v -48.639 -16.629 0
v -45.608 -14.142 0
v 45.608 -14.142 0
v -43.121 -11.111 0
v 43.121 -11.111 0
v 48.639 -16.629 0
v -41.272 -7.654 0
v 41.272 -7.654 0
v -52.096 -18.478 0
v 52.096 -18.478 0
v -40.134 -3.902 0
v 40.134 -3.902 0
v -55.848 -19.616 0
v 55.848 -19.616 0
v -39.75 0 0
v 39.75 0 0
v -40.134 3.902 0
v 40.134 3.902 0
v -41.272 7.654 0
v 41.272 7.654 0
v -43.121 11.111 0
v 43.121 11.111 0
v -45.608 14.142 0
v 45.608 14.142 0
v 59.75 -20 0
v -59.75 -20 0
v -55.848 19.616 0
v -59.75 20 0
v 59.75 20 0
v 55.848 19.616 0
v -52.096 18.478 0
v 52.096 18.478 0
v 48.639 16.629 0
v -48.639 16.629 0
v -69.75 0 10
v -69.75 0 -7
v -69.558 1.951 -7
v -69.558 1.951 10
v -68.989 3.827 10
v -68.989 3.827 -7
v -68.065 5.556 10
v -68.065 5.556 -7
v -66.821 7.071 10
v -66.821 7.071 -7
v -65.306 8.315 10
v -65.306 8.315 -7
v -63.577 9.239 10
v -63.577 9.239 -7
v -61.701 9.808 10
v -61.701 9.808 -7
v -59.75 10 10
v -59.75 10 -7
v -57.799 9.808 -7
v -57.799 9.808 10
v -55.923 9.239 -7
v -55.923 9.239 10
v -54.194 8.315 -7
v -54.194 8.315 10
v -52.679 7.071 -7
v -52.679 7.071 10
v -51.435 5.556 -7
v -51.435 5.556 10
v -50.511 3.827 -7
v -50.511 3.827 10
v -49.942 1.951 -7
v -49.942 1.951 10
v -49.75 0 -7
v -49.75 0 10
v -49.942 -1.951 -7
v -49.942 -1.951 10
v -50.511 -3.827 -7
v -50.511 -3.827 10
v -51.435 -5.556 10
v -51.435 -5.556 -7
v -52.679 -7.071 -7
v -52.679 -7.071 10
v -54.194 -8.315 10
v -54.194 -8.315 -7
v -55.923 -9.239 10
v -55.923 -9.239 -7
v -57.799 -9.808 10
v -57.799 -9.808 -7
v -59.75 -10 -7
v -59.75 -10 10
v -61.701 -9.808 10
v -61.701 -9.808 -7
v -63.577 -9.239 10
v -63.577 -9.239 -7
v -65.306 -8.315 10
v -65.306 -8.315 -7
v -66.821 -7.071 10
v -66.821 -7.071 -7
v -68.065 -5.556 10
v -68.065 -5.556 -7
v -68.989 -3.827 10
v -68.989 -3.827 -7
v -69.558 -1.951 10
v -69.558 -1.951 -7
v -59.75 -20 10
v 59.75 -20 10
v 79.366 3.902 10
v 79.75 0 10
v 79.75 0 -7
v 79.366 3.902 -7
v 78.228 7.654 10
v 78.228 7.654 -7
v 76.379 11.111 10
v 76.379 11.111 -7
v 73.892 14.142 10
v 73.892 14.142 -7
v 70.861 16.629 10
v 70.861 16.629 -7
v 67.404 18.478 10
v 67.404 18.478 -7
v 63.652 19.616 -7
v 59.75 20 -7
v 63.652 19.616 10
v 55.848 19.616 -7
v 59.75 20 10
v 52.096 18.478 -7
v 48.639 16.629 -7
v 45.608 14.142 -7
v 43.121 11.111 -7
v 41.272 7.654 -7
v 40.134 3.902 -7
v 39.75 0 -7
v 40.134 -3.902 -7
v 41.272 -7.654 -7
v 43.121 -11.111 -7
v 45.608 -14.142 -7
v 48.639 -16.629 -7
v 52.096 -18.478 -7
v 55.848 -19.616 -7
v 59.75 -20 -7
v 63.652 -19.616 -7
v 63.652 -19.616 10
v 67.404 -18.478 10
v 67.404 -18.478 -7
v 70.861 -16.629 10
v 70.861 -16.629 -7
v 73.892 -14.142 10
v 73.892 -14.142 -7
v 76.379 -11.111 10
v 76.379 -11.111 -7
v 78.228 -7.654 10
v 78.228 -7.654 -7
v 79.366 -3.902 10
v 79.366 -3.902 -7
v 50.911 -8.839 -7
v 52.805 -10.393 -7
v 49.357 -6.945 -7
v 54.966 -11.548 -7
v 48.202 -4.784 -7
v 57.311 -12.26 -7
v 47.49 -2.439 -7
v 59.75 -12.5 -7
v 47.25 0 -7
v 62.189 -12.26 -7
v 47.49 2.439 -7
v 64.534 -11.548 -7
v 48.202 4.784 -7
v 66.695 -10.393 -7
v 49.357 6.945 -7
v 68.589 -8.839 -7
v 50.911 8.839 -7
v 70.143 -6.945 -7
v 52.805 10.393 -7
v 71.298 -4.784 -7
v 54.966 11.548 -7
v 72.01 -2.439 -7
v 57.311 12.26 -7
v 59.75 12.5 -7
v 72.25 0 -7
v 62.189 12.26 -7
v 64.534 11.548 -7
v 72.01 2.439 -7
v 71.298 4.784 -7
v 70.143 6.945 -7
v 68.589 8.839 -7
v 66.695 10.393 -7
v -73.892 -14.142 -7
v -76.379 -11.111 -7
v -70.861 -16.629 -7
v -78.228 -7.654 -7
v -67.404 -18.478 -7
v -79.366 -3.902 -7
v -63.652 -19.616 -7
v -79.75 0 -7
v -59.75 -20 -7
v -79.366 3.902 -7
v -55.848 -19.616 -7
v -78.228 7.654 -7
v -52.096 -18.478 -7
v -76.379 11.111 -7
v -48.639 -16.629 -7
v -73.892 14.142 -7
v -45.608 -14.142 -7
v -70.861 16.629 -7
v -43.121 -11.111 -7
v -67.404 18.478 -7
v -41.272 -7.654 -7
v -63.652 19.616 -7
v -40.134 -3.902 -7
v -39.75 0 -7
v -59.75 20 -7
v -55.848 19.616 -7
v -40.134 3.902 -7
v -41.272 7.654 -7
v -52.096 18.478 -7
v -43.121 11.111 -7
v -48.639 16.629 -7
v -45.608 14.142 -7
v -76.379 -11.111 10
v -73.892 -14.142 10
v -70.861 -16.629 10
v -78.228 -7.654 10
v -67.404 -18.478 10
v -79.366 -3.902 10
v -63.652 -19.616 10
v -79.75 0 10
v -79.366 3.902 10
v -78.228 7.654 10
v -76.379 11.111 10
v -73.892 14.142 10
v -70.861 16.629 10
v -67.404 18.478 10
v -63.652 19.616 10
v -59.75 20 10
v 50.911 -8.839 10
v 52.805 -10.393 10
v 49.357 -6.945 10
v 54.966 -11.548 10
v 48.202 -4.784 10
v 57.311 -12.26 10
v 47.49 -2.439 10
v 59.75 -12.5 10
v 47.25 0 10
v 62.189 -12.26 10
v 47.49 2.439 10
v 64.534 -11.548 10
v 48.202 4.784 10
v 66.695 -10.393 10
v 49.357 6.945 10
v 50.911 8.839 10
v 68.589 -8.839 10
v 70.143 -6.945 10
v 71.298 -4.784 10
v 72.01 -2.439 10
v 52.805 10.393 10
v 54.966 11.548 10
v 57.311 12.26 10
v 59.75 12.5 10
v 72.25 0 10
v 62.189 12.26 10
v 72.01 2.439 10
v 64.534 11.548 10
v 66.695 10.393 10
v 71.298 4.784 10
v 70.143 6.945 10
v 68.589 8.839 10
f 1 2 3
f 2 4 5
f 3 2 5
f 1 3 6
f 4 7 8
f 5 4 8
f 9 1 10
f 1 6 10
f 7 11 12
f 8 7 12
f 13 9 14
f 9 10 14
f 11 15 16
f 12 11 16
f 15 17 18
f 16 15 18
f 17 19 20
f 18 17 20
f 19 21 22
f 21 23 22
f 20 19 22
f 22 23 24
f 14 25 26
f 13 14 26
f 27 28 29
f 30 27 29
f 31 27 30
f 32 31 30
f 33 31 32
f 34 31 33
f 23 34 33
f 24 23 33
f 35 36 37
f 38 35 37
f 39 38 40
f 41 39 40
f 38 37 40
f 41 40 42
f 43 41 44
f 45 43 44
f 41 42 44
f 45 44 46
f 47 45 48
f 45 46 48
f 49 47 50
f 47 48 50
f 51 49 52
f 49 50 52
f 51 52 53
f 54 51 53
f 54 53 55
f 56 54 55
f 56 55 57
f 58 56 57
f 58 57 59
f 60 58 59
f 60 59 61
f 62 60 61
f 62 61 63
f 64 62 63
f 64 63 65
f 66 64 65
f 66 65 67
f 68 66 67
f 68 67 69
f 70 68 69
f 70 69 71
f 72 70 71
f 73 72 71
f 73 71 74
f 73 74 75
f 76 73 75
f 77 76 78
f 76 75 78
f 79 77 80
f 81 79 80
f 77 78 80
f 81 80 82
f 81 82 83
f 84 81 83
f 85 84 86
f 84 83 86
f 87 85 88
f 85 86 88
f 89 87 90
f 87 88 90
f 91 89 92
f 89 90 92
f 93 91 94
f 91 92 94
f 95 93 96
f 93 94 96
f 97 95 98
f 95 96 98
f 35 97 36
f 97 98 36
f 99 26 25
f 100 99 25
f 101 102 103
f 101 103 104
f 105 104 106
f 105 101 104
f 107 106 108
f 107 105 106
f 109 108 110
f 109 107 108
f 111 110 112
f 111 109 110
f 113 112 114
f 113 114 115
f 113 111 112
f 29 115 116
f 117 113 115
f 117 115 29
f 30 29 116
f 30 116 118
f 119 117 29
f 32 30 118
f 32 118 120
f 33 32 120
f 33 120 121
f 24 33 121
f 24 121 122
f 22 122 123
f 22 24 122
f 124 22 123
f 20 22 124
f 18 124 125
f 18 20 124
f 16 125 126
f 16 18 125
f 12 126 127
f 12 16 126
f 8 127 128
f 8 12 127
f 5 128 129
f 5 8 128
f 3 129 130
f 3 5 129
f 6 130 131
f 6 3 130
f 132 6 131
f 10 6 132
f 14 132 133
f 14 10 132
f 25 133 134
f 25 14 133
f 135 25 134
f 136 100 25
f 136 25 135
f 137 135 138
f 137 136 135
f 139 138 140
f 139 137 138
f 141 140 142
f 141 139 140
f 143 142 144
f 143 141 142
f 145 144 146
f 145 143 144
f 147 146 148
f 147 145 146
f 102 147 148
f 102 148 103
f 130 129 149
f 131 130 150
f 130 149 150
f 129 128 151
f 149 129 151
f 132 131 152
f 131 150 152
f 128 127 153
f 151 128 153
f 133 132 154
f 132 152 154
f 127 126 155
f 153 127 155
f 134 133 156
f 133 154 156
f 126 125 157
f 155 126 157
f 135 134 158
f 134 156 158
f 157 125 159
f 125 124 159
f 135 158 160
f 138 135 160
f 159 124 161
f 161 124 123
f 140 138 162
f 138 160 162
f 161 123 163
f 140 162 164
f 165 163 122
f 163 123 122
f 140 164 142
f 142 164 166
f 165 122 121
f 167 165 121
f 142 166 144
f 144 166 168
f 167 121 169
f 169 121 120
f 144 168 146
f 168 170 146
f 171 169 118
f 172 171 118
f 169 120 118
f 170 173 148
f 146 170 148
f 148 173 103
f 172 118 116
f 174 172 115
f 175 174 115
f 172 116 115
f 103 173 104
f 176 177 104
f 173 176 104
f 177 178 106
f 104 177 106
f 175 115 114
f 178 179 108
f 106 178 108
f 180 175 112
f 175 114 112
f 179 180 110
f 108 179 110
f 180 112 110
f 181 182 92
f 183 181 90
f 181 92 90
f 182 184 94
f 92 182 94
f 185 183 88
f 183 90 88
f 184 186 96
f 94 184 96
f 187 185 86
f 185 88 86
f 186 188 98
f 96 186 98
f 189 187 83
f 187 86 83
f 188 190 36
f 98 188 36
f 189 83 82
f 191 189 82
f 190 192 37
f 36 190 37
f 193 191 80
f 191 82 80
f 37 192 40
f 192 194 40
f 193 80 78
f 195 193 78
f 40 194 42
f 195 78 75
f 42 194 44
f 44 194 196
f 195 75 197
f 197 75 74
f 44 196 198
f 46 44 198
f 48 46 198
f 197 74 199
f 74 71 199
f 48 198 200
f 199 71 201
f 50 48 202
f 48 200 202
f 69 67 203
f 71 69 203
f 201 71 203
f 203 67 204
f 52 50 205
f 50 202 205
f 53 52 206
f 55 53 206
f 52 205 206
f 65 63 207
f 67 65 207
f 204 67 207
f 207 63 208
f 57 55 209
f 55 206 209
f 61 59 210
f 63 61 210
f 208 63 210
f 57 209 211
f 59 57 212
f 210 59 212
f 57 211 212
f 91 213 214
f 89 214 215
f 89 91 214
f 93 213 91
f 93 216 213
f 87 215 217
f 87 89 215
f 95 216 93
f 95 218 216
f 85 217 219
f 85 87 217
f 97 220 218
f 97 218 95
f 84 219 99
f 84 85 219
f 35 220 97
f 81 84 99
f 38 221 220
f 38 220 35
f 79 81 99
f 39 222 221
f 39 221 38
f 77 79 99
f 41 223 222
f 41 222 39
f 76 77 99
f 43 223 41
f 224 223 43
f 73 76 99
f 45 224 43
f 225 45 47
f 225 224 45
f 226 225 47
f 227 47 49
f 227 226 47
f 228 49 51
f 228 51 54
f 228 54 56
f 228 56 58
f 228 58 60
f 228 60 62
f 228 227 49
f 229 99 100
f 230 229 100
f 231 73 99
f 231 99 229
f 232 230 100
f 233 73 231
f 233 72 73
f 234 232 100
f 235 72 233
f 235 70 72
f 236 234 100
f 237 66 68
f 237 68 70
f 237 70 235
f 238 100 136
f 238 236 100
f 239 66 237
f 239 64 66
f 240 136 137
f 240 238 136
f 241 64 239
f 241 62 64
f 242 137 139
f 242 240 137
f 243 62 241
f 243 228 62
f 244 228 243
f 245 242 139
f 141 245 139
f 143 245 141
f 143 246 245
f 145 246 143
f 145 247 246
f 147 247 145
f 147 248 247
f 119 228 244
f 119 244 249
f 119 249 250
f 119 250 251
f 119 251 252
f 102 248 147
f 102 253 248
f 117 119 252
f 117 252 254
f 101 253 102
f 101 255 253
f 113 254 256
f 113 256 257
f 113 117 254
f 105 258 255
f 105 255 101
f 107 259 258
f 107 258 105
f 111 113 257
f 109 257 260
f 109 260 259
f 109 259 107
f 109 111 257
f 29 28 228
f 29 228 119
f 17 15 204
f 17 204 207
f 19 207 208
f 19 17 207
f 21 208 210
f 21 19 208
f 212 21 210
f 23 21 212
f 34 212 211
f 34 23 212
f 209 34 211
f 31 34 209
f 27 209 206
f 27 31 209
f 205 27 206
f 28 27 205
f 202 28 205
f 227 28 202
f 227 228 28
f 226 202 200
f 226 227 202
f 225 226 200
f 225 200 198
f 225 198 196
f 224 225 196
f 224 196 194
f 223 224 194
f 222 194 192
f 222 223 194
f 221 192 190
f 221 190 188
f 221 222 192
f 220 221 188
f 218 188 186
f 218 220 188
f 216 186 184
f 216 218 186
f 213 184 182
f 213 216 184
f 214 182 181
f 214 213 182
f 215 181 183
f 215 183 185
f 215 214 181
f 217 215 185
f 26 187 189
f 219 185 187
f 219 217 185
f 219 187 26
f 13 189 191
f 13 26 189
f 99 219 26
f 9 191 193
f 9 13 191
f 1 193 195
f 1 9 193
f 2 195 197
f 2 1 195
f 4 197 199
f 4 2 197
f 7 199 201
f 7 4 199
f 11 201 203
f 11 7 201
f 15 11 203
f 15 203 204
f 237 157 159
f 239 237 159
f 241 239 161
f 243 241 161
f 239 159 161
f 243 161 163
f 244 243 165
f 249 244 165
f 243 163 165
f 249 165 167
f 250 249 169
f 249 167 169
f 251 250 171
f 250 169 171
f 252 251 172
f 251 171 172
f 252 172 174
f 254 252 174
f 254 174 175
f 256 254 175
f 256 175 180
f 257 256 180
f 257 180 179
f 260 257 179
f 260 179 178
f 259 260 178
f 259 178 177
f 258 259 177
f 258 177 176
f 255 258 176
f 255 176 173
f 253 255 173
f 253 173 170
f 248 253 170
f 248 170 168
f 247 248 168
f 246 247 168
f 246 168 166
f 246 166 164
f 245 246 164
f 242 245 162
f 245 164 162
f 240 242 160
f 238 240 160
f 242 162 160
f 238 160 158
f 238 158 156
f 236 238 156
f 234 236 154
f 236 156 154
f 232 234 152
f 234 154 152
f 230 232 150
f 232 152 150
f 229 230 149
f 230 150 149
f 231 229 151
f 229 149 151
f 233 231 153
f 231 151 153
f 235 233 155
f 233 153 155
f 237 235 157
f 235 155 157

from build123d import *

# Parameters (mm, degrees)
SCHIZZO1_W                   = 119.5
SCHIZZO1_H                   = 40
ESTRUSIONE_ESTRUSIONE1_DEPTH = 10
SCHIZZO2_R                   = 20
ESTRUSIONE_ESTRUSIONE2_DEPTH = 17
SCHIZZO3_R                   = 12.5
SCHIZZO3_R_2                 = 10
TAGLIO_ESTRUSIONE1_DEPTH     = 84.958695202


with BuildPart() as part:
    # Schizzo1 → Estrusione-Estrusione1 (new body)
    with BuildSketch(Plane.XY):
        Rectangle(SCHIZZO1_W, SCHIZZO1_H)
    extrude(amount=ESTRUSIONE_ESTRUSIONE1_DEPTH)

    # Schizzo2 → Estrusione-Estrusione2 (add)
    with BuildSketch(Plane.XY.offset(10)):
        with Locations((-59.75, 0)):
            Circle(SCHIZZO2_R)
        with Locations((59.75, 0)):
            Circle(SCHIZZO2_R)
    extrude(amount=-ESTRUSIONE_ESTRUSIONE2_DEPTH)

    # Schizzo3 → Taglio-Estrusione1 (cut, through all)
    with BuildSketch(Plane(origin=(0, 0, -7), x_dir=(-1, 0, 0), z_dir=(0, 0, -1))):
        with Locations((-59.75, 0)):
            Circle(SCHIZZO3_R)
        with Locations((59.75, 0)):
            Circle(SCHIZZO3_R_2)
    extrude(amount=-TAGLIO_ESTRUSIONE1_DEPTH, mode=Mode.SUBTRACT)


solid = part.part
